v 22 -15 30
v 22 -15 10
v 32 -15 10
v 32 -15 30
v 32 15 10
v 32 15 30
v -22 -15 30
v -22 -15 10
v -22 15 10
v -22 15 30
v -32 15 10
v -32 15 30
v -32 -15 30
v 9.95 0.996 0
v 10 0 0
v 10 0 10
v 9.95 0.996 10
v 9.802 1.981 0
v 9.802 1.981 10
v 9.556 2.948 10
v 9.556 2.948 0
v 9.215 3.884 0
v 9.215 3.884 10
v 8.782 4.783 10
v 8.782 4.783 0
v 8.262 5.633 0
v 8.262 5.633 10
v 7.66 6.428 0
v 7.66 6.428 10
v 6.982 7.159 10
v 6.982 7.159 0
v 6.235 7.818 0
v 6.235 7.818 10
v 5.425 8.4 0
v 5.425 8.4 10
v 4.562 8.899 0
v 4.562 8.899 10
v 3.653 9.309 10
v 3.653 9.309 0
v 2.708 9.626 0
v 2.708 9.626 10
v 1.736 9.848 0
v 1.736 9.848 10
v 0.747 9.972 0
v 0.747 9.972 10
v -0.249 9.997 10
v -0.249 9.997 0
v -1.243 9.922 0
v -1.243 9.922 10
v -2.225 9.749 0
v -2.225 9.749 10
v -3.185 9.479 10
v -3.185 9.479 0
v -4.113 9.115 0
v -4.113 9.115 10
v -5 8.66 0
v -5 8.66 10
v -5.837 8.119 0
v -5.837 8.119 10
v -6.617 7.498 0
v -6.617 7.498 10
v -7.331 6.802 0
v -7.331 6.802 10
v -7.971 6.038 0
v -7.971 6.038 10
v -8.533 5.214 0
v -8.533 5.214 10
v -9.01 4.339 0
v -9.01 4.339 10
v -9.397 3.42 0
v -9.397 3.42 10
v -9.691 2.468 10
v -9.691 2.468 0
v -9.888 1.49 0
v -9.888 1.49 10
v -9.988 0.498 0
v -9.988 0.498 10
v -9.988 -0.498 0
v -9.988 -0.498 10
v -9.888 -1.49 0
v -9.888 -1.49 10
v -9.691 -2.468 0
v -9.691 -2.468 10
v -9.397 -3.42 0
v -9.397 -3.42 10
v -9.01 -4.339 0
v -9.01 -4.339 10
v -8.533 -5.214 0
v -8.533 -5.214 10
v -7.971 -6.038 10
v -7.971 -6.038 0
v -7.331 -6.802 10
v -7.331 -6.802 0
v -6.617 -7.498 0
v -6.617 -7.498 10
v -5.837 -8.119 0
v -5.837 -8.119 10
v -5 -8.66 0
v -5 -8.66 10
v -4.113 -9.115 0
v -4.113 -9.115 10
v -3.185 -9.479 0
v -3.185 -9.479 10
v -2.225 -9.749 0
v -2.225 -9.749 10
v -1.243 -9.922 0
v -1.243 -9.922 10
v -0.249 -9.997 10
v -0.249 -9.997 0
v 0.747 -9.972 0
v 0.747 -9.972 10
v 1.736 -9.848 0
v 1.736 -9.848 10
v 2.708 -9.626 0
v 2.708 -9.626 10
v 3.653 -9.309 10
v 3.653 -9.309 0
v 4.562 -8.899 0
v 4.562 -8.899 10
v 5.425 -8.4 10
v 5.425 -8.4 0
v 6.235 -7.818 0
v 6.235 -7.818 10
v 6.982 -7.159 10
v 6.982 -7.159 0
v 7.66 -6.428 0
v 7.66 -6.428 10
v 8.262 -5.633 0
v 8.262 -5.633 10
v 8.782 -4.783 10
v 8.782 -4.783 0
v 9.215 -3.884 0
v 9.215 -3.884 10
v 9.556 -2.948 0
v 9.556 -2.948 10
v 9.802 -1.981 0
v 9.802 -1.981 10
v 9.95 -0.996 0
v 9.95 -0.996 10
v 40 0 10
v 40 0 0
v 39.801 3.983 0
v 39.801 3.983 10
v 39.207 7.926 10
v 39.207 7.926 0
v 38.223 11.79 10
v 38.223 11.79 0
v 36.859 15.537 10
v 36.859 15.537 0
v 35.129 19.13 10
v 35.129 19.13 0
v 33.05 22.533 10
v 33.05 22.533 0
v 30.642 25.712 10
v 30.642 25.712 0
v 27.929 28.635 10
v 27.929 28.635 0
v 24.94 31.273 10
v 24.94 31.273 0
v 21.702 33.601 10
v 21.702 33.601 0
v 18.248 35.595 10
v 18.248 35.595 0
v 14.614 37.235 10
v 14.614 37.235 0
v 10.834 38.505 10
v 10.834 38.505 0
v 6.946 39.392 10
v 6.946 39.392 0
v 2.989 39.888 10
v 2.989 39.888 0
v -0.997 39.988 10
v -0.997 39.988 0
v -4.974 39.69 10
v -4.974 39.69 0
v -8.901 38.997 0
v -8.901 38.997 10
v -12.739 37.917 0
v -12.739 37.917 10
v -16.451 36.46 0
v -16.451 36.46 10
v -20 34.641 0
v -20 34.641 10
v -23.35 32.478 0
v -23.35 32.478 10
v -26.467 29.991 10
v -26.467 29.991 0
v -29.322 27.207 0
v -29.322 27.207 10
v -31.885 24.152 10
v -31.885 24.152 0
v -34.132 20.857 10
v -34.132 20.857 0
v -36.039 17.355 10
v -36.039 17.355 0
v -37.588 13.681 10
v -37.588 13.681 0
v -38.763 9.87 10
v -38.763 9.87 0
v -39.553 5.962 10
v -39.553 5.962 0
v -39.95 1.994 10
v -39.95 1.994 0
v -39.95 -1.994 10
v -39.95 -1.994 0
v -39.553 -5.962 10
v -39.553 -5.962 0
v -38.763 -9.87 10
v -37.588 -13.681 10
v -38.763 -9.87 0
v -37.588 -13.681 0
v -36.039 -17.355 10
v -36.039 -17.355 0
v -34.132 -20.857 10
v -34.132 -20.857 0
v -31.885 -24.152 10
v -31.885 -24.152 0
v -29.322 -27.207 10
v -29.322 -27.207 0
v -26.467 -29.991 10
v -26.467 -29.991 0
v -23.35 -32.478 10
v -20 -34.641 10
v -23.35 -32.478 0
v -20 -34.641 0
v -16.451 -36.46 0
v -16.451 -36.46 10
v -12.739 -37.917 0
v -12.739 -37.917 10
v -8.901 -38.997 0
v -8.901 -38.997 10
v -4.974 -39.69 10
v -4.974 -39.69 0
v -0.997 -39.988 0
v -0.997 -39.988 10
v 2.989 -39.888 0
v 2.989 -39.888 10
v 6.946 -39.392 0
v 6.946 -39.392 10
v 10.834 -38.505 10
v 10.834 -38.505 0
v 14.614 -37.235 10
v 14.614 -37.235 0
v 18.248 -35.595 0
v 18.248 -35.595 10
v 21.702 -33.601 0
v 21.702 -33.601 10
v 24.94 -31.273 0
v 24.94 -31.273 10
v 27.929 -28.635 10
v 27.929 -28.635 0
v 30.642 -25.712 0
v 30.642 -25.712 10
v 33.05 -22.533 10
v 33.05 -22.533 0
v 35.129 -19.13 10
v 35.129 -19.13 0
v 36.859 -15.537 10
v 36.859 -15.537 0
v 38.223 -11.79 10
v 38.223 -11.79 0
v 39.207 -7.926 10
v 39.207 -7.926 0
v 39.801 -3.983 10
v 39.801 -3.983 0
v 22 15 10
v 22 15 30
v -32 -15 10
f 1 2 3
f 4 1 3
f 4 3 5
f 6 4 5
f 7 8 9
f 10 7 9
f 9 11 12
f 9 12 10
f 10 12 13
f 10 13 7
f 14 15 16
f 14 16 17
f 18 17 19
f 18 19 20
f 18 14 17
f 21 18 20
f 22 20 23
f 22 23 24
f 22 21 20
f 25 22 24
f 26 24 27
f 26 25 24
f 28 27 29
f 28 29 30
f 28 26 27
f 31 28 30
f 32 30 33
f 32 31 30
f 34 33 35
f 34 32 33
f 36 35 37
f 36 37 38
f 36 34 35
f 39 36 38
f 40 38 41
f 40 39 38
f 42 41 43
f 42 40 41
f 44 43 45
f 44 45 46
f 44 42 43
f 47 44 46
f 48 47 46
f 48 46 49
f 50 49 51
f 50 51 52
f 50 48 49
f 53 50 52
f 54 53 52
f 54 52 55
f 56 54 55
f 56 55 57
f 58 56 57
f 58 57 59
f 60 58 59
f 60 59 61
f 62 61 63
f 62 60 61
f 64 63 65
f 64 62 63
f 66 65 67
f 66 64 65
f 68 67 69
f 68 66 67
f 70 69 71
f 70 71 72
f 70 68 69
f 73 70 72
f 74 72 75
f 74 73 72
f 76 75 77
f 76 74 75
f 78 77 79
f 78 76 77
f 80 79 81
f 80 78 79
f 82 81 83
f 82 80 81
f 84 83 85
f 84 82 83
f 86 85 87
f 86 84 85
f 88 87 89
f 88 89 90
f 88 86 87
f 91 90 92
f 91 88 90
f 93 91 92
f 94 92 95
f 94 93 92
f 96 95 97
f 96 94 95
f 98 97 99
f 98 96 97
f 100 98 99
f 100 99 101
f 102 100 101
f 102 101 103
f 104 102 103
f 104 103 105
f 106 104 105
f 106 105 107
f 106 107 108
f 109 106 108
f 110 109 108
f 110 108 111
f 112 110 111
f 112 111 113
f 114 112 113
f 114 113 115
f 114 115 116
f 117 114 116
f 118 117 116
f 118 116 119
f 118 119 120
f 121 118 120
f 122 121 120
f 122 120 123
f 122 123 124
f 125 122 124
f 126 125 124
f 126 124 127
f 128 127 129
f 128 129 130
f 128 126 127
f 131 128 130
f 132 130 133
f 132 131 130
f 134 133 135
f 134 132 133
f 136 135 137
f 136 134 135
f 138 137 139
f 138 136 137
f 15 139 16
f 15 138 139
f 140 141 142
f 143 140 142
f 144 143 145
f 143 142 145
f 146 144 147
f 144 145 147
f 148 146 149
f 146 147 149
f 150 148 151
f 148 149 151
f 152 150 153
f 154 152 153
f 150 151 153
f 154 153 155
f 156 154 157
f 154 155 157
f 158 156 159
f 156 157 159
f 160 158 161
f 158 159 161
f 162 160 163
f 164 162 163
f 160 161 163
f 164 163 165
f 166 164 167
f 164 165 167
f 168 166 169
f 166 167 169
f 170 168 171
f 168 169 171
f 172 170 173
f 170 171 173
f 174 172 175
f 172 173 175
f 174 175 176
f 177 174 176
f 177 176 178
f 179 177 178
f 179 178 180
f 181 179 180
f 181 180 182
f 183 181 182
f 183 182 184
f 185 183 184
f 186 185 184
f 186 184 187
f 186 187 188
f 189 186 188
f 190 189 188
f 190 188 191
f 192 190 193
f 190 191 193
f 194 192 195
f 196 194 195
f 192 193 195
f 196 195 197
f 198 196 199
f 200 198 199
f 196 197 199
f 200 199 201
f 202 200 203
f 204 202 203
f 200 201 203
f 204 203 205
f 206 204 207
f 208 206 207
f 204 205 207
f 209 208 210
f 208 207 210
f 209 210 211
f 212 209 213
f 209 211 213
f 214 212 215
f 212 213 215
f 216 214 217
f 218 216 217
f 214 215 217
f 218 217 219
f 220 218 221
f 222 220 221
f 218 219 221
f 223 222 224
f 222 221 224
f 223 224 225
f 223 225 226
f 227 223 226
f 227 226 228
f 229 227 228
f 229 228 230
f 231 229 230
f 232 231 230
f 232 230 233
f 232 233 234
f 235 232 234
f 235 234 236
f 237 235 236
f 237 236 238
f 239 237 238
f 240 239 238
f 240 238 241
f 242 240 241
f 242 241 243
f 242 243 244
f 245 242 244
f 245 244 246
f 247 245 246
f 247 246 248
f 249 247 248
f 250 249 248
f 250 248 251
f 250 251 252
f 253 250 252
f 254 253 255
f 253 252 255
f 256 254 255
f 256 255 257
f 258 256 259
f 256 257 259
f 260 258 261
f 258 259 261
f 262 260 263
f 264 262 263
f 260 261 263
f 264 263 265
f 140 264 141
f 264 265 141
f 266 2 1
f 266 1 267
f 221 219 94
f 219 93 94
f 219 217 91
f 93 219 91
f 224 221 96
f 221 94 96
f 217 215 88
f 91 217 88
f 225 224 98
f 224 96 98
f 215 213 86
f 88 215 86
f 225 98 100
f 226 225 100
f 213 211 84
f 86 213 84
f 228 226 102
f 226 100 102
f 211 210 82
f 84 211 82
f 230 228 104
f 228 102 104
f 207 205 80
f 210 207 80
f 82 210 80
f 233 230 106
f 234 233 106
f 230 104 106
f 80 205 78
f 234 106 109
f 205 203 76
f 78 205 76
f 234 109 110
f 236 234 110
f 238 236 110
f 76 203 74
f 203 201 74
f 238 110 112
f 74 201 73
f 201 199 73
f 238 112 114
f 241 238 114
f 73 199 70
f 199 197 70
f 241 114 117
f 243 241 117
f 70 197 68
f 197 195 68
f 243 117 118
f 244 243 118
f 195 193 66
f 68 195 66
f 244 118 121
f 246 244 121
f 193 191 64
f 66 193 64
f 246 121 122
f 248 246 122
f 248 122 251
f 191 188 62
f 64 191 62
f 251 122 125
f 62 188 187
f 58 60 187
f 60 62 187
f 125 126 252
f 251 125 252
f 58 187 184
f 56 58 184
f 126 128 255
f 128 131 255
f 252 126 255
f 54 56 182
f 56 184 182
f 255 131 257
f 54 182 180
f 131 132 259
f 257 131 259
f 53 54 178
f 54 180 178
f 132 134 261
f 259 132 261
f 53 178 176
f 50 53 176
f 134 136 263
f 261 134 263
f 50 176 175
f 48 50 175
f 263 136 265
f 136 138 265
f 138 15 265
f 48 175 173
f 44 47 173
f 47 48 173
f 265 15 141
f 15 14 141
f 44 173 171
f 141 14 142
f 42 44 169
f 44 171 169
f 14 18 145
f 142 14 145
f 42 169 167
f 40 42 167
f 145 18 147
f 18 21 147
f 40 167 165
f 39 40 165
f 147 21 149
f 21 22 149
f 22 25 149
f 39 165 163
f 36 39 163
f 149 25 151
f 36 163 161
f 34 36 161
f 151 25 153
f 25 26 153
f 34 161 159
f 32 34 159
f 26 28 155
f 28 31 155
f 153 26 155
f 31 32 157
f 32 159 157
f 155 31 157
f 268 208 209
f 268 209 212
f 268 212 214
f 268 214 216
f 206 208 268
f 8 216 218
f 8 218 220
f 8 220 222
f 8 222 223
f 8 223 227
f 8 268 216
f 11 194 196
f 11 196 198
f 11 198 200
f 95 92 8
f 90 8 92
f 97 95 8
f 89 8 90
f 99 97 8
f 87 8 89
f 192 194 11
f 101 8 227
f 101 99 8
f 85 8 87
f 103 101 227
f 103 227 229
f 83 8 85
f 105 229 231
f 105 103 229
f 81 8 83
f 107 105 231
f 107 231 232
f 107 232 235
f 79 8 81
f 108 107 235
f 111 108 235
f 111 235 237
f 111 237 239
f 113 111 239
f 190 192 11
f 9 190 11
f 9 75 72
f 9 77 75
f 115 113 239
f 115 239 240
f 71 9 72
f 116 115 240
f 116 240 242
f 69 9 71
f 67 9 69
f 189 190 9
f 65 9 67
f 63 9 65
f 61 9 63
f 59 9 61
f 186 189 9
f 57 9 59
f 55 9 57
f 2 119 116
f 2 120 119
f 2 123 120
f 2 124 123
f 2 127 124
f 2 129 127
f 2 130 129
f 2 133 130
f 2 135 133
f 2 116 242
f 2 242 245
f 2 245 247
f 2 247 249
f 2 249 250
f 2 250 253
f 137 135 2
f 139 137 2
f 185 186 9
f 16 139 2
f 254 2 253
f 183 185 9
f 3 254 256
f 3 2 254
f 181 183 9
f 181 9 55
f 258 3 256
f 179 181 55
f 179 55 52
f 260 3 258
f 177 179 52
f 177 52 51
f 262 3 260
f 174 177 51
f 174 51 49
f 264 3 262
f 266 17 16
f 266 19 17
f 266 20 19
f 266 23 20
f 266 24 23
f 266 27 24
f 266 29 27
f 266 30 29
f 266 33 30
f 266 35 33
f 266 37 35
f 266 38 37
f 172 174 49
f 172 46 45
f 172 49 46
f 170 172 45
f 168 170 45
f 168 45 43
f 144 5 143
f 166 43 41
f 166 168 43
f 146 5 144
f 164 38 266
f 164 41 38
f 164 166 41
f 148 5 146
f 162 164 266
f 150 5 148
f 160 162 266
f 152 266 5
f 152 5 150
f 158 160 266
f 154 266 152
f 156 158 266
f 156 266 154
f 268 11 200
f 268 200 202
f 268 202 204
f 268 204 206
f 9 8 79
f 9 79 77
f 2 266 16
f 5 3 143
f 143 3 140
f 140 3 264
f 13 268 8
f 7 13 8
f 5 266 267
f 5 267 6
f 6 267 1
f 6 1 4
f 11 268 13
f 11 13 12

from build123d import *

# Parameters (mm, degrees)
SKETCH_R     = 40
SKETCH_R_2   = 10
PAD_DEPTH    = 10
SKETCH001_W  = 10
SKETCH001_H  = 30
PAD001_DEPTH = 20


with BuildPart() as part:
    # Sketch → Pad (new body)
    with BuildSketch(Plane.XY):
        Circle(SKETCH_R)
        Circle(SKETCH_R_2, mode=Mode.SUBTRACT)
    extrude(amount=PAD_DEPTH)

    # Sketch001 → Pad001 (new body)
    with BuildSketch(Plane.XY.offset(10)):
        with Locations((-27, 0)):
            Rectangle(SKETCH001_W, SKETCH001_H)
        with Locations((27, 0)):
            Rectangle(SKETCH001_W, SKETCH001_H)
    extrude(amount=PAD001_DEPTH)


solid = part.part
